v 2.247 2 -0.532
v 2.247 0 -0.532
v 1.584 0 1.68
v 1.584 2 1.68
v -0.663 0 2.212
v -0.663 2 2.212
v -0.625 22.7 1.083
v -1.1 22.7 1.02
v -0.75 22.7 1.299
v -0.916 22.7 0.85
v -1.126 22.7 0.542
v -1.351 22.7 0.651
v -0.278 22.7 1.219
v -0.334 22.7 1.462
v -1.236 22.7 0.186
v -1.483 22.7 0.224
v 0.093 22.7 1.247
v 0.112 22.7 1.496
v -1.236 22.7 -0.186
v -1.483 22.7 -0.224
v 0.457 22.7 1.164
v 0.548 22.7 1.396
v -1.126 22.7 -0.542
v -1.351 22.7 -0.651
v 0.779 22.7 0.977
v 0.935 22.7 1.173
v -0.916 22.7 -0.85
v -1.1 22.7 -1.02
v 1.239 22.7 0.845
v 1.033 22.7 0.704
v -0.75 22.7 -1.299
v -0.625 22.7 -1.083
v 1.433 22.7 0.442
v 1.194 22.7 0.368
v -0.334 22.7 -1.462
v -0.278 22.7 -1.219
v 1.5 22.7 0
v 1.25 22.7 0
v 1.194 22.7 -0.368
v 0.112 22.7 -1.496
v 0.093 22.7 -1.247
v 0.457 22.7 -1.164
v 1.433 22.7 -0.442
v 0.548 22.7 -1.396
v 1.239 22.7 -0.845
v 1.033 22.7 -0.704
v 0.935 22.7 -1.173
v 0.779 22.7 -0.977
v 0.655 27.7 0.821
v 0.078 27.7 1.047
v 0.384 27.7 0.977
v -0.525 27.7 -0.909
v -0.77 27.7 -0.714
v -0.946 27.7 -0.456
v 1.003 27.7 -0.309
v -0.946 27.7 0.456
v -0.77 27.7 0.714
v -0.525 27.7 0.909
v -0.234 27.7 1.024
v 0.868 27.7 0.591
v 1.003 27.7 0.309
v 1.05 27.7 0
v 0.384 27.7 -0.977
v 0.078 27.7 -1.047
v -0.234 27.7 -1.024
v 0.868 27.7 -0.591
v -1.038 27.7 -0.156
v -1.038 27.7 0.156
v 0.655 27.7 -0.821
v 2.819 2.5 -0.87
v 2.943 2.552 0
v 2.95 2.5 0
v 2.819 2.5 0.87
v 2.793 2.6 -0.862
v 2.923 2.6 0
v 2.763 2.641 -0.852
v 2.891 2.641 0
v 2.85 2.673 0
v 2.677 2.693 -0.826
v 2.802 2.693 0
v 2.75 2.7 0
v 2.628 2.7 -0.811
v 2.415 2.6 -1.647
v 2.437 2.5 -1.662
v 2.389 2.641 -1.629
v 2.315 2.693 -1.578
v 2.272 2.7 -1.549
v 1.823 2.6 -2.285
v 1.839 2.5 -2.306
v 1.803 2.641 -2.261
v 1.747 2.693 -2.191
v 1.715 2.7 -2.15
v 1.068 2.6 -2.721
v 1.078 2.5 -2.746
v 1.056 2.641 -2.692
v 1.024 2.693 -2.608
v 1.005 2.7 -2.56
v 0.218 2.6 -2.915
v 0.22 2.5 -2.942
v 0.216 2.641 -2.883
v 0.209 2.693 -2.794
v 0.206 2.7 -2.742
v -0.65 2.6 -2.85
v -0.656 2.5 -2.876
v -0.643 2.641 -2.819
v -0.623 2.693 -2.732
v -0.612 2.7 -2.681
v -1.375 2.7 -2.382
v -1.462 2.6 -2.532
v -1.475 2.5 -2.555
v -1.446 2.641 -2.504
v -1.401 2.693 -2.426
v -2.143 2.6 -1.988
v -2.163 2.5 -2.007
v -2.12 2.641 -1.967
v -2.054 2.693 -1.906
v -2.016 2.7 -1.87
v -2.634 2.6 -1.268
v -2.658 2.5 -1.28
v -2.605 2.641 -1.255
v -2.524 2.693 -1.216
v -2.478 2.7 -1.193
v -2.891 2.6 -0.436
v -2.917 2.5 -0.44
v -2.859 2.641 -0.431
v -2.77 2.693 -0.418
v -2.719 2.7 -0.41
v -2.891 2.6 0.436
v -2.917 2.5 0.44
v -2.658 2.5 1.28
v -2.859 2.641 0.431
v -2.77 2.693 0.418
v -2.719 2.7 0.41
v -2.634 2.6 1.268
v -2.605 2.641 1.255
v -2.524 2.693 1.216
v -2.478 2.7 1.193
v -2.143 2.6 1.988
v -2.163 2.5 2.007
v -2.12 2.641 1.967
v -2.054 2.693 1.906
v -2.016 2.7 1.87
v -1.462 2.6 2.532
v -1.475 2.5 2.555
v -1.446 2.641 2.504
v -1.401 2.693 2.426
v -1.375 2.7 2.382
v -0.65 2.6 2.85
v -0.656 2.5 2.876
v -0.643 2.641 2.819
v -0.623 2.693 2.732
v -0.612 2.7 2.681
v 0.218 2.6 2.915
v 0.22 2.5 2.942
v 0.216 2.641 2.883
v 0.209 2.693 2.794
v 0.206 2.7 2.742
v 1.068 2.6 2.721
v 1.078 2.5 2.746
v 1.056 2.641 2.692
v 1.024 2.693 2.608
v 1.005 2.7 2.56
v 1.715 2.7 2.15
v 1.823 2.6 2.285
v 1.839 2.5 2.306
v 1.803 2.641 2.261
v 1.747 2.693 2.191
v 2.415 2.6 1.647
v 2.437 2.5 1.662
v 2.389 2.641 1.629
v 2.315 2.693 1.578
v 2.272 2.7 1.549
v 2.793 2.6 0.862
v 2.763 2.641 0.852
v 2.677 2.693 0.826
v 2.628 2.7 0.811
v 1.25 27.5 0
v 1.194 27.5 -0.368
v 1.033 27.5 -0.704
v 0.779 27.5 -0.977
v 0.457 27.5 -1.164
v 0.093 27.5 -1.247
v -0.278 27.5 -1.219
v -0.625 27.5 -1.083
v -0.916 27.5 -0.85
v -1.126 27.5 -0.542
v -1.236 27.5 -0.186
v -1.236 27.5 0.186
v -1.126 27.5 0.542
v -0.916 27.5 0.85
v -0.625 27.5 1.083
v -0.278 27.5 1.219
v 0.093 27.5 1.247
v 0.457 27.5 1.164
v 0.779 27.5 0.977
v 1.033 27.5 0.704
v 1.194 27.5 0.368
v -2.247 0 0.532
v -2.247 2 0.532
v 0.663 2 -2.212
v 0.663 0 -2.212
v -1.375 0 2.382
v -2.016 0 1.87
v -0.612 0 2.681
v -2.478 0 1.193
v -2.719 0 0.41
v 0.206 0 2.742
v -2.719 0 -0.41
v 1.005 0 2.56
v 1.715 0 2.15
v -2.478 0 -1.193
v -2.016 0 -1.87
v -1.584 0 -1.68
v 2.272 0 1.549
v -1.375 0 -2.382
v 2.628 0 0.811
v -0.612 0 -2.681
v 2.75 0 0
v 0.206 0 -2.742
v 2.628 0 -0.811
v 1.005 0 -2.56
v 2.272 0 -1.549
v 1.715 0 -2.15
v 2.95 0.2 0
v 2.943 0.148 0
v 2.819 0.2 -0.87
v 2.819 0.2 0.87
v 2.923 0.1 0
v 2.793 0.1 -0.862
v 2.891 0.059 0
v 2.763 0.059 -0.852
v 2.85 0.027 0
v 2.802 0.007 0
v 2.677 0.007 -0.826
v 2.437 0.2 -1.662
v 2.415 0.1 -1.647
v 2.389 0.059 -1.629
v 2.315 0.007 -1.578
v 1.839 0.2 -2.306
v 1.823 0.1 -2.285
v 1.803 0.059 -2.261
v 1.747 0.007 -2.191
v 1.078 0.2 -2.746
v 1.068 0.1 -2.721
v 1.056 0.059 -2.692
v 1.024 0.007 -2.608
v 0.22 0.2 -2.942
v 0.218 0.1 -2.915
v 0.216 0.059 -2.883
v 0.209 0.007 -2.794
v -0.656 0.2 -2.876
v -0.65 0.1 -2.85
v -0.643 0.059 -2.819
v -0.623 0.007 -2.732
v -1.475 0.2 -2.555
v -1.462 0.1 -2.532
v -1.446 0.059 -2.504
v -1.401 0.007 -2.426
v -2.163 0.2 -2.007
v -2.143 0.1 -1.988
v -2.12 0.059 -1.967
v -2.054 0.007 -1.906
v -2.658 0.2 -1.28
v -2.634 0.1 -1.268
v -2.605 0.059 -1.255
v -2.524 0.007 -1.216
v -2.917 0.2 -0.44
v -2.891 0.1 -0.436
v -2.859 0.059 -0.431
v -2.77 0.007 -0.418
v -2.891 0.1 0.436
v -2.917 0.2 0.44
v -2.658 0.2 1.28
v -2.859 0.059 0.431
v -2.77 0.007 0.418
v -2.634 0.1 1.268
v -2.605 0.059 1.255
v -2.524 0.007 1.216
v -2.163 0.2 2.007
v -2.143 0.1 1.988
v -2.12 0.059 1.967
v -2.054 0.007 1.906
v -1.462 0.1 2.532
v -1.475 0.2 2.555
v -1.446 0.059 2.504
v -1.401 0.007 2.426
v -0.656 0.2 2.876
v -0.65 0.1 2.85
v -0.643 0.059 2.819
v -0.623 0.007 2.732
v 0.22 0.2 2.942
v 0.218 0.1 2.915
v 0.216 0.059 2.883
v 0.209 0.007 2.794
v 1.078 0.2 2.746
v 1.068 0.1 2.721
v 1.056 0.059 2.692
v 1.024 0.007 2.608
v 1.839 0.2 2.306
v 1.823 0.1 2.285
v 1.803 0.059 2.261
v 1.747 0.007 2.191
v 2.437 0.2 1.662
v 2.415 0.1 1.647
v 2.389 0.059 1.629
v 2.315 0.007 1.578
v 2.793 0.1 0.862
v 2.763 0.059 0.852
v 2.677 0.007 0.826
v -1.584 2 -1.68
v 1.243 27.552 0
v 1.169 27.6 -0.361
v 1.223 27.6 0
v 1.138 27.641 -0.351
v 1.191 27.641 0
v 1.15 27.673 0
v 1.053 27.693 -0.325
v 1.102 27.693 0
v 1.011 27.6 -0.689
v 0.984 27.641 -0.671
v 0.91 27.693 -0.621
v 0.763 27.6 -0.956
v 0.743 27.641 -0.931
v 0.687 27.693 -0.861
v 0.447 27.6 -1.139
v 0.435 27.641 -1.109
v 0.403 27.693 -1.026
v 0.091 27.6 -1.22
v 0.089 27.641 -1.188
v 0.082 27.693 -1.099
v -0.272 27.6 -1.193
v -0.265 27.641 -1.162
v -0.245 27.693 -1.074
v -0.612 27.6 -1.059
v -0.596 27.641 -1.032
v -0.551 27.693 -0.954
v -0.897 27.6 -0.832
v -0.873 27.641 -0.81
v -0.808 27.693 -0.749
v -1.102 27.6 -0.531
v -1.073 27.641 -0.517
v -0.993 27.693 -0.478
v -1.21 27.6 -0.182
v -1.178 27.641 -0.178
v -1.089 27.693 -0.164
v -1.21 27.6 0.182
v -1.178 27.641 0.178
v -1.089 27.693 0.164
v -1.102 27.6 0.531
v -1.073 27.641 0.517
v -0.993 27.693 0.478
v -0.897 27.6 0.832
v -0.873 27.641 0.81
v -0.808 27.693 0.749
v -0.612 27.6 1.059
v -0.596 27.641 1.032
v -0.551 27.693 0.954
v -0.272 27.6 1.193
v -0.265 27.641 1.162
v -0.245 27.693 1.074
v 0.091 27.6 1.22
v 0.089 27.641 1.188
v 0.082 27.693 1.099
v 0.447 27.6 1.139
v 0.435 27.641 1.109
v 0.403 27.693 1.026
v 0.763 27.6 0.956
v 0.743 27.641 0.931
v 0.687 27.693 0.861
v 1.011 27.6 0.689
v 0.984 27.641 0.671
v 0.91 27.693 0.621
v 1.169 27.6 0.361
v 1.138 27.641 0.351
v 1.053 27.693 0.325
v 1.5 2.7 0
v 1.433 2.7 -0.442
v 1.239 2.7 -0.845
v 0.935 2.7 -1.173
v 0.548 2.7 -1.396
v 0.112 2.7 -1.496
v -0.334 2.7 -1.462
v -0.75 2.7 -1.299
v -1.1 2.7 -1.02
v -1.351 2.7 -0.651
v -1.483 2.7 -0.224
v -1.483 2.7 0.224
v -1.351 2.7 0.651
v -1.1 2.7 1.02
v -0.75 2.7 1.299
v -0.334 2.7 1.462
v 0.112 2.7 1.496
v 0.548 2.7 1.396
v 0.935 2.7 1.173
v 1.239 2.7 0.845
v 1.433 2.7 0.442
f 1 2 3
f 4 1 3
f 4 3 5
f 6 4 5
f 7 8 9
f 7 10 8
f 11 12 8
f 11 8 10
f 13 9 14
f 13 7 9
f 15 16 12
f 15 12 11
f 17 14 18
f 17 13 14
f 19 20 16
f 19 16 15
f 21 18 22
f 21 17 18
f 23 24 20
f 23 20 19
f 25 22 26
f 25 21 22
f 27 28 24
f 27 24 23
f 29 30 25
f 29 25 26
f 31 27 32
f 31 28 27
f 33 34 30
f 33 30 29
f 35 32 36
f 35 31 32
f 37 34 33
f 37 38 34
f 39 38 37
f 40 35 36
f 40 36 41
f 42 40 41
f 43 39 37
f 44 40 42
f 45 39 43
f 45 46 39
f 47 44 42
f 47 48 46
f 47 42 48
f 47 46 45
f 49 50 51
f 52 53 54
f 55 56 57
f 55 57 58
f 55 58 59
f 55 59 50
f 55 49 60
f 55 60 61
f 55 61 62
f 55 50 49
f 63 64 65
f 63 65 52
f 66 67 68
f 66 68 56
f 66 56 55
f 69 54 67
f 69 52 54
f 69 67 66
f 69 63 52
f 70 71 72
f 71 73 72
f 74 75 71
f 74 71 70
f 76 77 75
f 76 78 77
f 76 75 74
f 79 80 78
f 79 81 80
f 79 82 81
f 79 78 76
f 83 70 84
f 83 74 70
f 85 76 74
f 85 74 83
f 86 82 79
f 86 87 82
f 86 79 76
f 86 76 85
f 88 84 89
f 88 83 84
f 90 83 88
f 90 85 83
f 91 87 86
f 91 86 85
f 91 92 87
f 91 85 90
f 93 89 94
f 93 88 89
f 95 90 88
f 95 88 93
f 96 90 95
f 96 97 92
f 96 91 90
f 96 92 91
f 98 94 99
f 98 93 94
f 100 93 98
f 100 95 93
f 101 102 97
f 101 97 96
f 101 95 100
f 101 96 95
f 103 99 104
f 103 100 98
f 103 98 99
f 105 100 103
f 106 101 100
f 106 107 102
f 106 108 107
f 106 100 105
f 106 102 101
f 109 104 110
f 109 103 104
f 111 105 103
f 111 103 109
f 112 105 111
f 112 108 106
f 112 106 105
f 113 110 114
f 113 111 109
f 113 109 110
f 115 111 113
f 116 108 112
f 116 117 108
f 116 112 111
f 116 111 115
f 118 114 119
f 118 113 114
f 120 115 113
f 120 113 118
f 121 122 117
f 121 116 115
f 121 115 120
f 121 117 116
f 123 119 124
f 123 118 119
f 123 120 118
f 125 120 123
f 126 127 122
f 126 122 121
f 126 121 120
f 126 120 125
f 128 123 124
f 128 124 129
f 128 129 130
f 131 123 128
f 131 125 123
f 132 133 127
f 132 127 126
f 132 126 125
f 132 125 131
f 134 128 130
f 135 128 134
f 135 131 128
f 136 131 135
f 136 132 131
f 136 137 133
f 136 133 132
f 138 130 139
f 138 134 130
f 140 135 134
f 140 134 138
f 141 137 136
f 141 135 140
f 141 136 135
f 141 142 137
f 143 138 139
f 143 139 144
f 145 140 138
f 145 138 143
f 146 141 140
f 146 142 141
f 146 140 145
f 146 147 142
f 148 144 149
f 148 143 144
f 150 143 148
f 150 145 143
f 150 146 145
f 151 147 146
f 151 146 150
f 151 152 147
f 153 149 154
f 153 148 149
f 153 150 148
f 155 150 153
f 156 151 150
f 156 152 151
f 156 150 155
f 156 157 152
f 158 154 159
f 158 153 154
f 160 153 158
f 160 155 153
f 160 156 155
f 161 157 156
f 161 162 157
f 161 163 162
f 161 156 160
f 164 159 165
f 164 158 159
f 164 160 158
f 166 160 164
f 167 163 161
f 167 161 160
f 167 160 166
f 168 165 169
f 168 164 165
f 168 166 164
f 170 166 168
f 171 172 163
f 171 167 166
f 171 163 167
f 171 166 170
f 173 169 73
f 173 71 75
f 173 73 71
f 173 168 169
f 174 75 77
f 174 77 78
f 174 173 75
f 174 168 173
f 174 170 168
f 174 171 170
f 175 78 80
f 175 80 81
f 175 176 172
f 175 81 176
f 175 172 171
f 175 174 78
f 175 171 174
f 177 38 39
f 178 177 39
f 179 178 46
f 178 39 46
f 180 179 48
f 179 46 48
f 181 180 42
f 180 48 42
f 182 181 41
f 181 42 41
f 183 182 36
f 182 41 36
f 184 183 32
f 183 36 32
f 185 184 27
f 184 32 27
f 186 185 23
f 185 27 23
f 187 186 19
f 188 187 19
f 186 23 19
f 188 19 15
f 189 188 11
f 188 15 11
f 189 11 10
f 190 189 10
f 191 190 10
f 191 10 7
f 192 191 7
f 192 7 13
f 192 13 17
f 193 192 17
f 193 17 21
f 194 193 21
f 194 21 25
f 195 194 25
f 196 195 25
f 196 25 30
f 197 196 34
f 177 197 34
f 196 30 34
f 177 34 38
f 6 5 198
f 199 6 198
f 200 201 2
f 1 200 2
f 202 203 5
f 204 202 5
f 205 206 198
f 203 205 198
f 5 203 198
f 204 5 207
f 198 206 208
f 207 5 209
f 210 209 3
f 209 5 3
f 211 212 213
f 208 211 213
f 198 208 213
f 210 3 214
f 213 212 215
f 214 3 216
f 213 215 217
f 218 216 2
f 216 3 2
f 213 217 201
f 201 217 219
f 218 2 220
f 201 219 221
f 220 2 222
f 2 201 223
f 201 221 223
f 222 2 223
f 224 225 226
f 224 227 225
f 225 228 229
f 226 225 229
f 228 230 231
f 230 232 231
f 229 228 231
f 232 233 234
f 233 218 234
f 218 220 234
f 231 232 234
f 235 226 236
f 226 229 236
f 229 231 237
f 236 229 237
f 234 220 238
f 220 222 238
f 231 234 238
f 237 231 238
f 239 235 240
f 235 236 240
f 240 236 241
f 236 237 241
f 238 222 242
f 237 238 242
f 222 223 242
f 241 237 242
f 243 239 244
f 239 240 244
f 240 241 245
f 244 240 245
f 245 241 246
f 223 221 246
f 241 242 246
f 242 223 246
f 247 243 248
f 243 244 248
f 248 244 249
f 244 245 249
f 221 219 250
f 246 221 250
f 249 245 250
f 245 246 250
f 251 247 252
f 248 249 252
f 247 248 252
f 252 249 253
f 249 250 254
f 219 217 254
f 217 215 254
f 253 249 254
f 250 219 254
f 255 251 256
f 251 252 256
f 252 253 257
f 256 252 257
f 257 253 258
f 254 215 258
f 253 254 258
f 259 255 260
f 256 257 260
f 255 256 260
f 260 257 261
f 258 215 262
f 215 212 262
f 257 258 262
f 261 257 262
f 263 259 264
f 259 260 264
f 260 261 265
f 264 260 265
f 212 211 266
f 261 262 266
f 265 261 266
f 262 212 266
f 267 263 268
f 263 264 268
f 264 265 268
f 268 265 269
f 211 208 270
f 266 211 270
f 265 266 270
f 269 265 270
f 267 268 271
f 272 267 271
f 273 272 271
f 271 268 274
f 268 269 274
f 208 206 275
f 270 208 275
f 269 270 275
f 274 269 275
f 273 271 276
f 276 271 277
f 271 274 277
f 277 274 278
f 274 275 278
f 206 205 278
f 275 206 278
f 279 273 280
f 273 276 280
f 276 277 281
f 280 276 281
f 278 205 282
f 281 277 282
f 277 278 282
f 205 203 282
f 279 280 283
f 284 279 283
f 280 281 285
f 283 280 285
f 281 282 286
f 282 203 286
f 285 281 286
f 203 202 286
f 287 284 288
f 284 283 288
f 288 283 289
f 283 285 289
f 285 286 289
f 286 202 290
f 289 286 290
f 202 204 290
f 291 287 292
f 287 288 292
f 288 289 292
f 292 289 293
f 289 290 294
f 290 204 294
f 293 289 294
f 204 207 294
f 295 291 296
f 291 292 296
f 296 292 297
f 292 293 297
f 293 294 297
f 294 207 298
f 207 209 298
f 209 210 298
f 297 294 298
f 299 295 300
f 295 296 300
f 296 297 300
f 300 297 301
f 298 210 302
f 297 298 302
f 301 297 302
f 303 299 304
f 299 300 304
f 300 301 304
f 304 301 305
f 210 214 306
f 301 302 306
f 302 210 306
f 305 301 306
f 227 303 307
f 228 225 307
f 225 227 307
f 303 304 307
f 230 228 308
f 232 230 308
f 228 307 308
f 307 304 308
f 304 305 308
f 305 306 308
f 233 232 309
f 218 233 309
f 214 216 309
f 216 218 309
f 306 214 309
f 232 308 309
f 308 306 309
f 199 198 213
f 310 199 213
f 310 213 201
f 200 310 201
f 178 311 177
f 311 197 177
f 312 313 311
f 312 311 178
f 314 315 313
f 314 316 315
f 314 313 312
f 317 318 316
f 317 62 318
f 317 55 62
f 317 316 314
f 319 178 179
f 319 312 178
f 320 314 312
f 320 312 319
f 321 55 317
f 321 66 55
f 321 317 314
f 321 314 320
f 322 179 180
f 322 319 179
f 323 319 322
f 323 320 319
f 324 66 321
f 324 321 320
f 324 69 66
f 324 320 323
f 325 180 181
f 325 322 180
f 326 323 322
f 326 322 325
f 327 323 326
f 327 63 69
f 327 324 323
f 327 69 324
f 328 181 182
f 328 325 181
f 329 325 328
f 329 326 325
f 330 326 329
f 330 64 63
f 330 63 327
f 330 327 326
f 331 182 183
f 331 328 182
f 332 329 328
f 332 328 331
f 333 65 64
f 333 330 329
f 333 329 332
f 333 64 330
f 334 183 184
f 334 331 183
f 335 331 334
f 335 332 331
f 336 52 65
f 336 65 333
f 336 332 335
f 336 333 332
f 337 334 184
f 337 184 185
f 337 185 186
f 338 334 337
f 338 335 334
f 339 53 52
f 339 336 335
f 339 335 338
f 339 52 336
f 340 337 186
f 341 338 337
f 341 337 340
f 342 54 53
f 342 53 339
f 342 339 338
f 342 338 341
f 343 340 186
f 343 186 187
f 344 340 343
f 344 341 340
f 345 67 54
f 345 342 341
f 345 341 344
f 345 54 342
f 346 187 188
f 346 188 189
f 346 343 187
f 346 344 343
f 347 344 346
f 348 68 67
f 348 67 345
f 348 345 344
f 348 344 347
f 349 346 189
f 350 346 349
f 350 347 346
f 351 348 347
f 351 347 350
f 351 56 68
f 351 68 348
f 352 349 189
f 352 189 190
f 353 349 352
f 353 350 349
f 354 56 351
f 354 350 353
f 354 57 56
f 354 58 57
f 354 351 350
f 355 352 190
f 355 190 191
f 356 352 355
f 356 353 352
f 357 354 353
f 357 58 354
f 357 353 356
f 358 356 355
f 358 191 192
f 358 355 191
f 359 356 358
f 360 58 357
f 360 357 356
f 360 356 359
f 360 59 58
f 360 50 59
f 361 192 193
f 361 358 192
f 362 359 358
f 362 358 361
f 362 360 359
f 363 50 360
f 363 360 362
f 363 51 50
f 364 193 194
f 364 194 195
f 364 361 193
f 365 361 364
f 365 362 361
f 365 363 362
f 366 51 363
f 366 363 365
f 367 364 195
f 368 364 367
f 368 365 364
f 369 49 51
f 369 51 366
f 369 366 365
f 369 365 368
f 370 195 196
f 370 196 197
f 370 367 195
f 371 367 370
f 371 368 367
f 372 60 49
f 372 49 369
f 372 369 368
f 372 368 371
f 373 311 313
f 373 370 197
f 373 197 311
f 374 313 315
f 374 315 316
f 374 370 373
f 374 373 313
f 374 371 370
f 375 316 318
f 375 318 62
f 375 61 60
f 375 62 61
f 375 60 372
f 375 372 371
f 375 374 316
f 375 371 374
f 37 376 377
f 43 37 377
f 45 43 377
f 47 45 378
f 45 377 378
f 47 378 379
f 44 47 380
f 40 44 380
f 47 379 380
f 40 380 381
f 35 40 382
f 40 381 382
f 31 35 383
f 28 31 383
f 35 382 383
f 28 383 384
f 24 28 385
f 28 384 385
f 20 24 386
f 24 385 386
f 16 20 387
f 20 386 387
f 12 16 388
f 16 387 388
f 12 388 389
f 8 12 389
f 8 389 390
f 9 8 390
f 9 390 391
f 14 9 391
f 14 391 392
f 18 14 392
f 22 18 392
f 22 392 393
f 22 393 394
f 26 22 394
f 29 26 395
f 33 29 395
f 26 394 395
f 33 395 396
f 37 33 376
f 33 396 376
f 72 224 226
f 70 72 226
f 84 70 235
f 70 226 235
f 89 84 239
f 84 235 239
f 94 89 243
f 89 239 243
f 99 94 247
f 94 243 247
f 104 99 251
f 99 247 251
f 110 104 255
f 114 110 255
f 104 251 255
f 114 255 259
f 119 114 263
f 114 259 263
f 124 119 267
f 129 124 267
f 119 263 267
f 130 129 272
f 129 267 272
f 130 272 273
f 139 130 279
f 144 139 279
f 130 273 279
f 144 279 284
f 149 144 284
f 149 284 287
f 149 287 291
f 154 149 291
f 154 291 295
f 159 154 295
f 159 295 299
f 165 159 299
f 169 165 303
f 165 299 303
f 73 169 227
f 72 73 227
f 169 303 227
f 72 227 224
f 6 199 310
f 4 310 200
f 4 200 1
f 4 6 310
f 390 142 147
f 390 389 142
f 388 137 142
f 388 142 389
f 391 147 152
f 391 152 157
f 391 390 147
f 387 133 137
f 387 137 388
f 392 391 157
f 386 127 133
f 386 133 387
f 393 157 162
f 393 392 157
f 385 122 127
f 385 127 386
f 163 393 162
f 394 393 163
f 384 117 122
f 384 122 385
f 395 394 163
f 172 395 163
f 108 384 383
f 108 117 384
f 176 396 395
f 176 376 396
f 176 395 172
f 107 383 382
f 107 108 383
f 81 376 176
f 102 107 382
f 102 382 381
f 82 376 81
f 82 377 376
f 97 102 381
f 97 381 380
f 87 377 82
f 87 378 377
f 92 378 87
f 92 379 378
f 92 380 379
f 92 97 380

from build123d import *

# Parameters (mm, degrees)
SKETCH_1_R          = 2.95
EXTRUDE_1_DEPTH     = 2.7
SKETCH_2_R          = 1.5
EXTRUDE_2_DEPTH     = 20
SKETCH_3_R          = 1.25
EXTRUDE_3_DEPTH     = 5
CUT_EXTRUDE_1_DEPTH = 2
FILLET_1_R          = 0.2


with BuildPart() as part:
    # 草图1 → 凸台-拉伸1 (new body)
    with BuildSketch(Plane(origin=(0, 0, 0), x_dir=(1, 0, 0), z_dir=(0, 1, 0))):
        Circle(SKETCH_1_R)
    extrude(amount=EXTRUDE_1_DEPTH)

    # 草图2 → 凸台-拉伸2 (add)
    with BuildSketch(Plane(origin=(0, 2.7, 0), x_dir=(1, 0, 0), z_dir=(0, 1, 0))):
        Circle(SKETCH_2_R)
    extrude(amount=EXTRUDE_2_DEPTH)

    # 草图3 → 凸台-拉伸3 (add)
    with BuildSketch(Plane(origin=(0, 22.7, 0), x_dir=(1, 0, 0), z_dir=(0, 1, 0))):
        Circle(SKETCH_3_R)
    extrude(amount=EXTRUDE_3_DEPTH)

    # 草图4 → 切除-拉伸1 (cut)
    with BuildSketch(Plane.XZ):
        Polygon((2.247285488, -0.53201623), (1.584382314, 1.680198207), (-0.662903174, 2.212214437), (-2.247285488, 0.53201623), (-1.584382314, -1.680198207), (0.662903174, -2.212214437), align=None)
    extrude(amount=-CUT_EXTRUDE_1_DEPTH, mode=Mode.SUBTRACT)

    # 圆角1
    fillet_1_edges = [part.edges().sort_by_distance(p)[0] for p in [
        (-1.25, 27.7, 0),
        (-2.95, 0, 0),
        (-2.95, 2.7, 0),
    ]]
    fillet(fillet_1_edges, radius=FILLET_1_R)


solid = part.part
